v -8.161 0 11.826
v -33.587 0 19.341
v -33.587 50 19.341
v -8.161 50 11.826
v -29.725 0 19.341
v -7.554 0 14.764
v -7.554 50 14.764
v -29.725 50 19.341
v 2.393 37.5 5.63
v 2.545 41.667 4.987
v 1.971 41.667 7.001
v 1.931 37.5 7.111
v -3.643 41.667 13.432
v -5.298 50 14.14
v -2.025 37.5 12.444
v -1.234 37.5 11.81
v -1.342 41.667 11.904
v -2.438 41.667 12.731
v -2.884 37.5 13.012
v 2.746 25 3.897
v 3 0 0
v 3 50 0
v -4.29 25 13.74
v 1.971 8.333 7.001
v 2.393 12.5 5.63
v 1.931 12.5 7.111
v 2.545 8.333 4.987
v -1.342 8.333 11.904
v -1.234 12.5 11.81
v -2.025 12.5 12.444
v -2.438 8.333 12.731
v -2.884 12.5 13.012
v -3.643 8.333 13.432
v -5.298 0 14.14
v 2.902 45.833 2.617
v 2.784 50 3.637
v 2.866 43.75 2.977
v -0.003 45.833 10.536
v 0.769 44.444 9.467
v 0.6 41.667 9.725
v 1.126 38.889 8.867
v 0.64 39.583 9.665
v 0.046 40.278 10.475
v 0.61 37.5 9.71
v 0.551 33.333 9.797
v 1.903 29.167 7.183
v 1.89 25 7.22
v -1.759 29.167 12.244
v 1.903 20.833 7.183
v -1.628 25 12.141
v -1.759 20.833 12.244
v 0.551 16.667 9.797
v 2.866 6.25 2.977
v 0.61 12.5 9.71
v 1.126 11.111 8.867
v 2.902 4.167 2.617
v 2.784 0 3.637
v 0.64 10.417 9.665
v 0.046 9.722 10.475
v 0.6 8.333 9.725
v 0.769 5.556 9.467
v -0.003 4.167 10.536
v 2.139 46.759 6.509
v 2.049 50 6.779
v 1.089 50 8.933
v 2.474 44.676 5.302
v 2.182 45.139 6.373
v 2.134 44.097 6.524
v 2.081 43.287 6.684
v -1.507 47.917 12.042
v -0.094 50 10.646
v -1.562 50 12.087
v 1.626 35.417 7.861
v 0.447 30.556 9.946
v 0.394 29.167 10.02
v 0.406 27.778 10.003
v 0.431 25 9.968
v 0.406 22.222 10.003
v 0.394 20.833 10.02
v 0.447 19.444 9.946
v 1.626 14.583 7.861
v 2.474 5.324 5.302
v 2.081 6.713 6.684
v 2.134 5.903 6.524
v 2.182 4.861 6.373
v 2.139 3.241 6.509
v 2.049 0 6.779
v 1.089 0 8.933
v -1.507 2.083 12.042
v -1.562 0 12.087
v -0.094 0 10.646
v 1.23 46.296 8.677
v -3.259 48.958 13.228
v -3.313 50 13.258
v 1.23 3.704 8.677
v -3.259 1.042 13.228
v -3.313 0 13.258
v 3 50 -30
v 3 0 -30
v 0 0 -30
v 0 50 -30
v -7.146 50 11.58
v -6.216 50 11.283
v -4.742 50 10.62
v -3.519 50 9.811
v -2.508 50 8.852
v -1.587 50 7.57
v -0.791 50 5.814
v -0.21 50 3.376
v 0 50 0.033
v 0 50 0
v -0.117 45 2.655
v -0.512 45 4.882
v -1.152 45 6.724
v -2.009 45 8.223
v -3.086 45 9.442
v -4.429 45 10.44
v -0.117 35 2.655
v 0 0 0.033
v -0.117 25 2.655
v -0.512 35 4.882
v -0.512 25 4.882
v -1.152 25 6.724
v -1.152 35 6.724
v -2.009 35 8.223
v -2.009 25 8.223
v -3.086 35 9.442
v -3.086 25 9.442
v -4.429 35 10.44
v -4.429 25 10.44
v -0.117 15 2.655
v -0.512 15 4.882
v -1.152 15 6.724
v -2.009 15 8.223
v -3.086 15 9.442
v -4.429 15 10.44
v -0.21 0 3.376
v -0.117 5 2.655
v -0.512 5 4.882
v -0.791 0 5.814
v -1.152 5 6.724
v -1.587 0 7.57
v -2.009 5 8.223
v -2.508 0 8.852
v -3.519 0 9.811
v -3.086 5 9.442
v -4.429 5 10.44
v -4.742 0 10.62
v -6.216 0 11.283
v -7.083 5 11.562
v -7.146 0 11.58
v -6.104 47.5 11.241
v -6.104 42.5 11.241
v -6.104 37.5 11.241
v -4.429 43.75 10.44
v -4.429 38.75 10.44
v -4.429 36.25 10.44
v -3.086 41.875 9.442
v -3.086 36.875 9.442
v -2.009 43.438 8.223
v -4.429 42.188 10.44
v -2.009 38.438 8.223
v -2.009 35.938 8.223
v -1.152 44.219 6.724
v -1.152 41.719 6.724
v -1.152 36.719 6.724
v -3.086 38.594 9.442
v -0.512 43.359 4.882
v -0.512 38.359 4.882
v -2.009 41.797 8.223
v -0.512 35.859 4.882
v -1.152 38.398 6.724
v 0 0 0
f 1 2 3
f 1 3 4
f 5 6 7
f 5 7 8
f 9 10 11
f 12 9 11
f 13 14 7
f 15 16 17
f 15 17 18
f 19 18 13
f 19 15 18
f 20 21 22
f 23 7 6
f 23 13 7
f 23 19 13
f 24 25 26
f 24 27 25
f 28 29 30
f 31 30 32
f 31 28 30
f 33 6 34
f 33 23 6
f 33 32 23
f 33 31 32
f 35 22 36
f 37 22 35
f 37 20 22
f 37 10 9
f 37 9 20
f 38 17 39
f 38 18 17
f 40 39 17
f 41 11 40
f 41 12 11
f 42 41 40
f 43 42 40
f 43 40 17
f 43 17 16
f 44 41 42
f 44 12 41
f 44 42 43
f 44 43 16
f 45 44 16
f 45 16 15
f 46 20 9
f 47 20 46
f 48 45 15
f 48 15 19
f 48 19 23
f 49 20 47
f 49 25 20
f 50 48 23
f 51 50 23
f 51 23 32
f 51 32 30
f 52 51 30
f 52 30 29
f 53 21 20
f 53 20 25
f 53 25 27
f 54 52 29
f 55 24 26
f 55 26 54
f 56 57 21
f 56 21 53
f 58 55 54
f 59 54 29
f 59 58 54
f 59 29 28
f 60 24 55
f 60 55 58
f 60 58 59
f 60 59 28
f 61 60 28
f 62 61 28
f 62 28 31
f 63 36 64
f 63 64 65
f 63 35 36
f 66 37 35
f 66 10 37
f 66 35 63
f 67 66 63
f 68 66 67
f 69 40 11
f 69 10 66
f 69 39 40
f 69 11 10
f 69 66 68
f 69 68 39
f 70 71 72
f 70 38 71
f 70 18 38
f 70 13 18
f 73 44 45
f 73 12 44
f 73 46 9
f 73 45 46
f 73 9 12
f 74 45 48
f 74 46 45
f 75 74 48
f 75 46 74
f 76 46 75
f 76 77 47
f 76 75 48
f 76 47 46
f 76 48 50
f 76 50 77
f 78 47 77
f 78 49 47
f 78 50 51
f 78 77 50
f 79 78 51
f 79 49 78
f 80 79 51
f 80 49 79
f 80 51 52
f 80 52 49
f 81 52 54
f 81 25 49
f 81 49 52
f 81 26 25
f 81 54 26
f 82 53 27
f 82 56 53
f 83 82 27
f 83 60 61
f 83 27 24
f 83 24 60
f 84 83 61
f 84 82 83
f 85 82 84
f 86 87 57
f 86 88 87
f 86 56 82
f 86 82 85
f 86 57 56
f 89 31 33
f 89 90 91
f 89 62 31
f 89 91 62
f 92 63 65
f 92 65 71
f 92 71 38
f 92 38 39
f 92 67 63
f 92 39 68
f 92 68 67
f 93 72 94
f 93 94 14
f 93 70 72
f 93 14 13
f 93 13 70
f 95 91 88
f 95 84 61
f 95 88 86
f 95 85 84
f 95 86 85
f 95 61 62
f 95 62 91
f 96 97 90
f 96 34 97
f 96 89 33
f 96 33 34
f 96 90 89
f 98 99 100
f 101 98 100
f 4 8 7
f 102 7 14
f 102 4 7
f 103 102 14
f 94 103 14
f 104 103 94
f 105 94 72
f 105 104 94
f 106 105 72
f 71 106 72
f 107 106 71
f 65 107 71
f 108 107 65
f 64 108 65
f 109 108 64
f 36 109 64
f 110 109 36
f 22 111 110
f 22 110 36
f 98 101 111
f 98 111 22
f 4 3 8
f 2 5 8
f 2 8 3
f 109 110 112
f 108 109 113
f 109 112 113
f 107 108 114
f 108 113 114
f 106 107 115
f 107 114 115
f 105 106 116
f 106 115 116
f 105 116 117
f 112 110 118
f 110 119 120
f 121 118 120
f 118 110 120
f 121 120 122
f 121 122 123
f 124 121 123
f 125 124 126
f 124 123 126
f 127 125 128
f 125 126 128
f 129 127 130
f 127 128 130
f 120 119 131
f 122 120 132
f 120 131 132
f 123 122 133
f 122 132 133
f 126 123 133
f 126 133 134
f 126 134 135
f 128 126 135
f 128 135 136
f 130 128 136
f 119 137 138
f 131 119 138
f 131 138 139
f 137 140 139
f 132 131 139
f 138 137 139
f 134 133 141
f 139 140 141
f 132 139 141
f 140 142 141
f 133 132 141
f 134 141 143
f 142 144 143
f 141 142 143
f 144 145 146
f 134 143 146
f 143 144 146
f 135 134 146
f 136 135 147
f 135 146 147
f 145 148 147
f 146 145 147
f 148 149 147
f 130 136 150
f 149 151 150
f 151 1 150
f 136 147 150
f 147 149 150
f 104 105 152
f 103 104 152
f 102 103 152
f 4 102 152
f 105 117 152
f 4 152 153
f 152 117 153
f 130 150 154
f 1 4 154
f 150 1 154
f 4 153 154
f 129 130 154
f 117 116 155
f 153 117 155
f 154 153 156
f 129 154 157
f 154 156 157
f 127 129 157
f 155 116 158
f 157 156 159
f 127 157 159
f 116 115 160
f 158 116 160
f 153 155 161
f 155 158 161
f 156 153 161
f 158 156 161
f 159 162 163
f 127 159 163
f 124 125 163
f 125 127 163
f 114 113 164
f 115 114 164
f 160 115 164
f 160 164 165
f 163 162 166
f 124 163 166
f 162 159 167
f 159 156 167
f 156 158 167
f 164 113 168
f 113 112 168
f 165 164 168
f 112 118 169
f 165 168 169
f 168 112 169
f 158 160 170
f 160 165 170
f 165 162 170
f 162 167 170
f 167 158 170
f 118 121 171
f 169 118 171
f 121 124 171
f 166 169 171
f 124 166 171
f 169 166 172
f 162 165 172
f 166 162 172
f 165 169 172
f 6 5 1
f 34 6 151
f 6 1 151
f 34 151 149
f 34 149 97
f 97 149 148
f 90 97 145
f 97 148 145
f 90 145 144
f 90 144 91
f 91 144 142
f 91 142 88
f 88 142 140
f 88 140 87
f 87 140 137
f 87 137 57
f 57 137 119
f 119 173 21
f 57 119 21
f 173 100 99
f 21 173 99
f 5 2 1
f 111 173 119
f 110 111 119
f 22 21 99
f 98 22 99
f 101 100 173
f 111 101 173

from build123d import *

# Parameters (mm, degrees)
BOSS_EXTRUDE1_DEPTH = 50


with BuildPart() as part:
    # Sketch1 → Boss-Extrude1 (new body)
    with BuildSketch(Plane(origin=(0, 0, 0), x_dir=(1, 0, 0), z_dir=(0, 1, 0))):
        Polygon((0, 30), (0, 0), (0.000186337, -0.03343628), (3, 0), (3, 30), align=None)
        with BuildLine():
            Line((0.000186337, -0.03343628), (3, 0))
            add(Edge.make_bspline(
                [(3, 0), (3.139918652, -12.553127515), (-7.554025616, -14.764008615)],
                knots=[0, 0, 0, 1, 1, 1], degree=2))
            Line((-7.554025616, -14.764008615), (-29.724787296, -19.341198123))
            Line((-29.724787296, -19.341198123), (-33.586790943, -19.341198123))
            Line((-33.586790943, -19.341198123), (-8.16140534, -11.826136958))
            add(Edge.make_bspline(
                [(0.000186337, -0.03343628), (0.005239929, -0.486831056), (-0.009475768, -1.417335062), (-0.137351147, -3.087884204), (-0.471550564, -4.947811199), (-1.116797216, -6.782204669), (-1.973725508, -8.269549477), (-3.042888675, -9.477251715), (-4.37173122, -10.472028768), (-5.764833241, -11.143024266), (-7.059525511, -11.570636997), (-7.798848397, -11.751181425), (-8.16140534, -11.826136958)],
                knots=[0, 0, 0, 0, 0.0625, 0.125, 0.25, 0.375, 0.5, 0.625, 0.75, 0.875, 0.9375, 1, 1, 1, 1], degree=3))
        make_face()
    extrude(amount=BOSS_EXTRUDE1_DEPTH)


solid = part.part
